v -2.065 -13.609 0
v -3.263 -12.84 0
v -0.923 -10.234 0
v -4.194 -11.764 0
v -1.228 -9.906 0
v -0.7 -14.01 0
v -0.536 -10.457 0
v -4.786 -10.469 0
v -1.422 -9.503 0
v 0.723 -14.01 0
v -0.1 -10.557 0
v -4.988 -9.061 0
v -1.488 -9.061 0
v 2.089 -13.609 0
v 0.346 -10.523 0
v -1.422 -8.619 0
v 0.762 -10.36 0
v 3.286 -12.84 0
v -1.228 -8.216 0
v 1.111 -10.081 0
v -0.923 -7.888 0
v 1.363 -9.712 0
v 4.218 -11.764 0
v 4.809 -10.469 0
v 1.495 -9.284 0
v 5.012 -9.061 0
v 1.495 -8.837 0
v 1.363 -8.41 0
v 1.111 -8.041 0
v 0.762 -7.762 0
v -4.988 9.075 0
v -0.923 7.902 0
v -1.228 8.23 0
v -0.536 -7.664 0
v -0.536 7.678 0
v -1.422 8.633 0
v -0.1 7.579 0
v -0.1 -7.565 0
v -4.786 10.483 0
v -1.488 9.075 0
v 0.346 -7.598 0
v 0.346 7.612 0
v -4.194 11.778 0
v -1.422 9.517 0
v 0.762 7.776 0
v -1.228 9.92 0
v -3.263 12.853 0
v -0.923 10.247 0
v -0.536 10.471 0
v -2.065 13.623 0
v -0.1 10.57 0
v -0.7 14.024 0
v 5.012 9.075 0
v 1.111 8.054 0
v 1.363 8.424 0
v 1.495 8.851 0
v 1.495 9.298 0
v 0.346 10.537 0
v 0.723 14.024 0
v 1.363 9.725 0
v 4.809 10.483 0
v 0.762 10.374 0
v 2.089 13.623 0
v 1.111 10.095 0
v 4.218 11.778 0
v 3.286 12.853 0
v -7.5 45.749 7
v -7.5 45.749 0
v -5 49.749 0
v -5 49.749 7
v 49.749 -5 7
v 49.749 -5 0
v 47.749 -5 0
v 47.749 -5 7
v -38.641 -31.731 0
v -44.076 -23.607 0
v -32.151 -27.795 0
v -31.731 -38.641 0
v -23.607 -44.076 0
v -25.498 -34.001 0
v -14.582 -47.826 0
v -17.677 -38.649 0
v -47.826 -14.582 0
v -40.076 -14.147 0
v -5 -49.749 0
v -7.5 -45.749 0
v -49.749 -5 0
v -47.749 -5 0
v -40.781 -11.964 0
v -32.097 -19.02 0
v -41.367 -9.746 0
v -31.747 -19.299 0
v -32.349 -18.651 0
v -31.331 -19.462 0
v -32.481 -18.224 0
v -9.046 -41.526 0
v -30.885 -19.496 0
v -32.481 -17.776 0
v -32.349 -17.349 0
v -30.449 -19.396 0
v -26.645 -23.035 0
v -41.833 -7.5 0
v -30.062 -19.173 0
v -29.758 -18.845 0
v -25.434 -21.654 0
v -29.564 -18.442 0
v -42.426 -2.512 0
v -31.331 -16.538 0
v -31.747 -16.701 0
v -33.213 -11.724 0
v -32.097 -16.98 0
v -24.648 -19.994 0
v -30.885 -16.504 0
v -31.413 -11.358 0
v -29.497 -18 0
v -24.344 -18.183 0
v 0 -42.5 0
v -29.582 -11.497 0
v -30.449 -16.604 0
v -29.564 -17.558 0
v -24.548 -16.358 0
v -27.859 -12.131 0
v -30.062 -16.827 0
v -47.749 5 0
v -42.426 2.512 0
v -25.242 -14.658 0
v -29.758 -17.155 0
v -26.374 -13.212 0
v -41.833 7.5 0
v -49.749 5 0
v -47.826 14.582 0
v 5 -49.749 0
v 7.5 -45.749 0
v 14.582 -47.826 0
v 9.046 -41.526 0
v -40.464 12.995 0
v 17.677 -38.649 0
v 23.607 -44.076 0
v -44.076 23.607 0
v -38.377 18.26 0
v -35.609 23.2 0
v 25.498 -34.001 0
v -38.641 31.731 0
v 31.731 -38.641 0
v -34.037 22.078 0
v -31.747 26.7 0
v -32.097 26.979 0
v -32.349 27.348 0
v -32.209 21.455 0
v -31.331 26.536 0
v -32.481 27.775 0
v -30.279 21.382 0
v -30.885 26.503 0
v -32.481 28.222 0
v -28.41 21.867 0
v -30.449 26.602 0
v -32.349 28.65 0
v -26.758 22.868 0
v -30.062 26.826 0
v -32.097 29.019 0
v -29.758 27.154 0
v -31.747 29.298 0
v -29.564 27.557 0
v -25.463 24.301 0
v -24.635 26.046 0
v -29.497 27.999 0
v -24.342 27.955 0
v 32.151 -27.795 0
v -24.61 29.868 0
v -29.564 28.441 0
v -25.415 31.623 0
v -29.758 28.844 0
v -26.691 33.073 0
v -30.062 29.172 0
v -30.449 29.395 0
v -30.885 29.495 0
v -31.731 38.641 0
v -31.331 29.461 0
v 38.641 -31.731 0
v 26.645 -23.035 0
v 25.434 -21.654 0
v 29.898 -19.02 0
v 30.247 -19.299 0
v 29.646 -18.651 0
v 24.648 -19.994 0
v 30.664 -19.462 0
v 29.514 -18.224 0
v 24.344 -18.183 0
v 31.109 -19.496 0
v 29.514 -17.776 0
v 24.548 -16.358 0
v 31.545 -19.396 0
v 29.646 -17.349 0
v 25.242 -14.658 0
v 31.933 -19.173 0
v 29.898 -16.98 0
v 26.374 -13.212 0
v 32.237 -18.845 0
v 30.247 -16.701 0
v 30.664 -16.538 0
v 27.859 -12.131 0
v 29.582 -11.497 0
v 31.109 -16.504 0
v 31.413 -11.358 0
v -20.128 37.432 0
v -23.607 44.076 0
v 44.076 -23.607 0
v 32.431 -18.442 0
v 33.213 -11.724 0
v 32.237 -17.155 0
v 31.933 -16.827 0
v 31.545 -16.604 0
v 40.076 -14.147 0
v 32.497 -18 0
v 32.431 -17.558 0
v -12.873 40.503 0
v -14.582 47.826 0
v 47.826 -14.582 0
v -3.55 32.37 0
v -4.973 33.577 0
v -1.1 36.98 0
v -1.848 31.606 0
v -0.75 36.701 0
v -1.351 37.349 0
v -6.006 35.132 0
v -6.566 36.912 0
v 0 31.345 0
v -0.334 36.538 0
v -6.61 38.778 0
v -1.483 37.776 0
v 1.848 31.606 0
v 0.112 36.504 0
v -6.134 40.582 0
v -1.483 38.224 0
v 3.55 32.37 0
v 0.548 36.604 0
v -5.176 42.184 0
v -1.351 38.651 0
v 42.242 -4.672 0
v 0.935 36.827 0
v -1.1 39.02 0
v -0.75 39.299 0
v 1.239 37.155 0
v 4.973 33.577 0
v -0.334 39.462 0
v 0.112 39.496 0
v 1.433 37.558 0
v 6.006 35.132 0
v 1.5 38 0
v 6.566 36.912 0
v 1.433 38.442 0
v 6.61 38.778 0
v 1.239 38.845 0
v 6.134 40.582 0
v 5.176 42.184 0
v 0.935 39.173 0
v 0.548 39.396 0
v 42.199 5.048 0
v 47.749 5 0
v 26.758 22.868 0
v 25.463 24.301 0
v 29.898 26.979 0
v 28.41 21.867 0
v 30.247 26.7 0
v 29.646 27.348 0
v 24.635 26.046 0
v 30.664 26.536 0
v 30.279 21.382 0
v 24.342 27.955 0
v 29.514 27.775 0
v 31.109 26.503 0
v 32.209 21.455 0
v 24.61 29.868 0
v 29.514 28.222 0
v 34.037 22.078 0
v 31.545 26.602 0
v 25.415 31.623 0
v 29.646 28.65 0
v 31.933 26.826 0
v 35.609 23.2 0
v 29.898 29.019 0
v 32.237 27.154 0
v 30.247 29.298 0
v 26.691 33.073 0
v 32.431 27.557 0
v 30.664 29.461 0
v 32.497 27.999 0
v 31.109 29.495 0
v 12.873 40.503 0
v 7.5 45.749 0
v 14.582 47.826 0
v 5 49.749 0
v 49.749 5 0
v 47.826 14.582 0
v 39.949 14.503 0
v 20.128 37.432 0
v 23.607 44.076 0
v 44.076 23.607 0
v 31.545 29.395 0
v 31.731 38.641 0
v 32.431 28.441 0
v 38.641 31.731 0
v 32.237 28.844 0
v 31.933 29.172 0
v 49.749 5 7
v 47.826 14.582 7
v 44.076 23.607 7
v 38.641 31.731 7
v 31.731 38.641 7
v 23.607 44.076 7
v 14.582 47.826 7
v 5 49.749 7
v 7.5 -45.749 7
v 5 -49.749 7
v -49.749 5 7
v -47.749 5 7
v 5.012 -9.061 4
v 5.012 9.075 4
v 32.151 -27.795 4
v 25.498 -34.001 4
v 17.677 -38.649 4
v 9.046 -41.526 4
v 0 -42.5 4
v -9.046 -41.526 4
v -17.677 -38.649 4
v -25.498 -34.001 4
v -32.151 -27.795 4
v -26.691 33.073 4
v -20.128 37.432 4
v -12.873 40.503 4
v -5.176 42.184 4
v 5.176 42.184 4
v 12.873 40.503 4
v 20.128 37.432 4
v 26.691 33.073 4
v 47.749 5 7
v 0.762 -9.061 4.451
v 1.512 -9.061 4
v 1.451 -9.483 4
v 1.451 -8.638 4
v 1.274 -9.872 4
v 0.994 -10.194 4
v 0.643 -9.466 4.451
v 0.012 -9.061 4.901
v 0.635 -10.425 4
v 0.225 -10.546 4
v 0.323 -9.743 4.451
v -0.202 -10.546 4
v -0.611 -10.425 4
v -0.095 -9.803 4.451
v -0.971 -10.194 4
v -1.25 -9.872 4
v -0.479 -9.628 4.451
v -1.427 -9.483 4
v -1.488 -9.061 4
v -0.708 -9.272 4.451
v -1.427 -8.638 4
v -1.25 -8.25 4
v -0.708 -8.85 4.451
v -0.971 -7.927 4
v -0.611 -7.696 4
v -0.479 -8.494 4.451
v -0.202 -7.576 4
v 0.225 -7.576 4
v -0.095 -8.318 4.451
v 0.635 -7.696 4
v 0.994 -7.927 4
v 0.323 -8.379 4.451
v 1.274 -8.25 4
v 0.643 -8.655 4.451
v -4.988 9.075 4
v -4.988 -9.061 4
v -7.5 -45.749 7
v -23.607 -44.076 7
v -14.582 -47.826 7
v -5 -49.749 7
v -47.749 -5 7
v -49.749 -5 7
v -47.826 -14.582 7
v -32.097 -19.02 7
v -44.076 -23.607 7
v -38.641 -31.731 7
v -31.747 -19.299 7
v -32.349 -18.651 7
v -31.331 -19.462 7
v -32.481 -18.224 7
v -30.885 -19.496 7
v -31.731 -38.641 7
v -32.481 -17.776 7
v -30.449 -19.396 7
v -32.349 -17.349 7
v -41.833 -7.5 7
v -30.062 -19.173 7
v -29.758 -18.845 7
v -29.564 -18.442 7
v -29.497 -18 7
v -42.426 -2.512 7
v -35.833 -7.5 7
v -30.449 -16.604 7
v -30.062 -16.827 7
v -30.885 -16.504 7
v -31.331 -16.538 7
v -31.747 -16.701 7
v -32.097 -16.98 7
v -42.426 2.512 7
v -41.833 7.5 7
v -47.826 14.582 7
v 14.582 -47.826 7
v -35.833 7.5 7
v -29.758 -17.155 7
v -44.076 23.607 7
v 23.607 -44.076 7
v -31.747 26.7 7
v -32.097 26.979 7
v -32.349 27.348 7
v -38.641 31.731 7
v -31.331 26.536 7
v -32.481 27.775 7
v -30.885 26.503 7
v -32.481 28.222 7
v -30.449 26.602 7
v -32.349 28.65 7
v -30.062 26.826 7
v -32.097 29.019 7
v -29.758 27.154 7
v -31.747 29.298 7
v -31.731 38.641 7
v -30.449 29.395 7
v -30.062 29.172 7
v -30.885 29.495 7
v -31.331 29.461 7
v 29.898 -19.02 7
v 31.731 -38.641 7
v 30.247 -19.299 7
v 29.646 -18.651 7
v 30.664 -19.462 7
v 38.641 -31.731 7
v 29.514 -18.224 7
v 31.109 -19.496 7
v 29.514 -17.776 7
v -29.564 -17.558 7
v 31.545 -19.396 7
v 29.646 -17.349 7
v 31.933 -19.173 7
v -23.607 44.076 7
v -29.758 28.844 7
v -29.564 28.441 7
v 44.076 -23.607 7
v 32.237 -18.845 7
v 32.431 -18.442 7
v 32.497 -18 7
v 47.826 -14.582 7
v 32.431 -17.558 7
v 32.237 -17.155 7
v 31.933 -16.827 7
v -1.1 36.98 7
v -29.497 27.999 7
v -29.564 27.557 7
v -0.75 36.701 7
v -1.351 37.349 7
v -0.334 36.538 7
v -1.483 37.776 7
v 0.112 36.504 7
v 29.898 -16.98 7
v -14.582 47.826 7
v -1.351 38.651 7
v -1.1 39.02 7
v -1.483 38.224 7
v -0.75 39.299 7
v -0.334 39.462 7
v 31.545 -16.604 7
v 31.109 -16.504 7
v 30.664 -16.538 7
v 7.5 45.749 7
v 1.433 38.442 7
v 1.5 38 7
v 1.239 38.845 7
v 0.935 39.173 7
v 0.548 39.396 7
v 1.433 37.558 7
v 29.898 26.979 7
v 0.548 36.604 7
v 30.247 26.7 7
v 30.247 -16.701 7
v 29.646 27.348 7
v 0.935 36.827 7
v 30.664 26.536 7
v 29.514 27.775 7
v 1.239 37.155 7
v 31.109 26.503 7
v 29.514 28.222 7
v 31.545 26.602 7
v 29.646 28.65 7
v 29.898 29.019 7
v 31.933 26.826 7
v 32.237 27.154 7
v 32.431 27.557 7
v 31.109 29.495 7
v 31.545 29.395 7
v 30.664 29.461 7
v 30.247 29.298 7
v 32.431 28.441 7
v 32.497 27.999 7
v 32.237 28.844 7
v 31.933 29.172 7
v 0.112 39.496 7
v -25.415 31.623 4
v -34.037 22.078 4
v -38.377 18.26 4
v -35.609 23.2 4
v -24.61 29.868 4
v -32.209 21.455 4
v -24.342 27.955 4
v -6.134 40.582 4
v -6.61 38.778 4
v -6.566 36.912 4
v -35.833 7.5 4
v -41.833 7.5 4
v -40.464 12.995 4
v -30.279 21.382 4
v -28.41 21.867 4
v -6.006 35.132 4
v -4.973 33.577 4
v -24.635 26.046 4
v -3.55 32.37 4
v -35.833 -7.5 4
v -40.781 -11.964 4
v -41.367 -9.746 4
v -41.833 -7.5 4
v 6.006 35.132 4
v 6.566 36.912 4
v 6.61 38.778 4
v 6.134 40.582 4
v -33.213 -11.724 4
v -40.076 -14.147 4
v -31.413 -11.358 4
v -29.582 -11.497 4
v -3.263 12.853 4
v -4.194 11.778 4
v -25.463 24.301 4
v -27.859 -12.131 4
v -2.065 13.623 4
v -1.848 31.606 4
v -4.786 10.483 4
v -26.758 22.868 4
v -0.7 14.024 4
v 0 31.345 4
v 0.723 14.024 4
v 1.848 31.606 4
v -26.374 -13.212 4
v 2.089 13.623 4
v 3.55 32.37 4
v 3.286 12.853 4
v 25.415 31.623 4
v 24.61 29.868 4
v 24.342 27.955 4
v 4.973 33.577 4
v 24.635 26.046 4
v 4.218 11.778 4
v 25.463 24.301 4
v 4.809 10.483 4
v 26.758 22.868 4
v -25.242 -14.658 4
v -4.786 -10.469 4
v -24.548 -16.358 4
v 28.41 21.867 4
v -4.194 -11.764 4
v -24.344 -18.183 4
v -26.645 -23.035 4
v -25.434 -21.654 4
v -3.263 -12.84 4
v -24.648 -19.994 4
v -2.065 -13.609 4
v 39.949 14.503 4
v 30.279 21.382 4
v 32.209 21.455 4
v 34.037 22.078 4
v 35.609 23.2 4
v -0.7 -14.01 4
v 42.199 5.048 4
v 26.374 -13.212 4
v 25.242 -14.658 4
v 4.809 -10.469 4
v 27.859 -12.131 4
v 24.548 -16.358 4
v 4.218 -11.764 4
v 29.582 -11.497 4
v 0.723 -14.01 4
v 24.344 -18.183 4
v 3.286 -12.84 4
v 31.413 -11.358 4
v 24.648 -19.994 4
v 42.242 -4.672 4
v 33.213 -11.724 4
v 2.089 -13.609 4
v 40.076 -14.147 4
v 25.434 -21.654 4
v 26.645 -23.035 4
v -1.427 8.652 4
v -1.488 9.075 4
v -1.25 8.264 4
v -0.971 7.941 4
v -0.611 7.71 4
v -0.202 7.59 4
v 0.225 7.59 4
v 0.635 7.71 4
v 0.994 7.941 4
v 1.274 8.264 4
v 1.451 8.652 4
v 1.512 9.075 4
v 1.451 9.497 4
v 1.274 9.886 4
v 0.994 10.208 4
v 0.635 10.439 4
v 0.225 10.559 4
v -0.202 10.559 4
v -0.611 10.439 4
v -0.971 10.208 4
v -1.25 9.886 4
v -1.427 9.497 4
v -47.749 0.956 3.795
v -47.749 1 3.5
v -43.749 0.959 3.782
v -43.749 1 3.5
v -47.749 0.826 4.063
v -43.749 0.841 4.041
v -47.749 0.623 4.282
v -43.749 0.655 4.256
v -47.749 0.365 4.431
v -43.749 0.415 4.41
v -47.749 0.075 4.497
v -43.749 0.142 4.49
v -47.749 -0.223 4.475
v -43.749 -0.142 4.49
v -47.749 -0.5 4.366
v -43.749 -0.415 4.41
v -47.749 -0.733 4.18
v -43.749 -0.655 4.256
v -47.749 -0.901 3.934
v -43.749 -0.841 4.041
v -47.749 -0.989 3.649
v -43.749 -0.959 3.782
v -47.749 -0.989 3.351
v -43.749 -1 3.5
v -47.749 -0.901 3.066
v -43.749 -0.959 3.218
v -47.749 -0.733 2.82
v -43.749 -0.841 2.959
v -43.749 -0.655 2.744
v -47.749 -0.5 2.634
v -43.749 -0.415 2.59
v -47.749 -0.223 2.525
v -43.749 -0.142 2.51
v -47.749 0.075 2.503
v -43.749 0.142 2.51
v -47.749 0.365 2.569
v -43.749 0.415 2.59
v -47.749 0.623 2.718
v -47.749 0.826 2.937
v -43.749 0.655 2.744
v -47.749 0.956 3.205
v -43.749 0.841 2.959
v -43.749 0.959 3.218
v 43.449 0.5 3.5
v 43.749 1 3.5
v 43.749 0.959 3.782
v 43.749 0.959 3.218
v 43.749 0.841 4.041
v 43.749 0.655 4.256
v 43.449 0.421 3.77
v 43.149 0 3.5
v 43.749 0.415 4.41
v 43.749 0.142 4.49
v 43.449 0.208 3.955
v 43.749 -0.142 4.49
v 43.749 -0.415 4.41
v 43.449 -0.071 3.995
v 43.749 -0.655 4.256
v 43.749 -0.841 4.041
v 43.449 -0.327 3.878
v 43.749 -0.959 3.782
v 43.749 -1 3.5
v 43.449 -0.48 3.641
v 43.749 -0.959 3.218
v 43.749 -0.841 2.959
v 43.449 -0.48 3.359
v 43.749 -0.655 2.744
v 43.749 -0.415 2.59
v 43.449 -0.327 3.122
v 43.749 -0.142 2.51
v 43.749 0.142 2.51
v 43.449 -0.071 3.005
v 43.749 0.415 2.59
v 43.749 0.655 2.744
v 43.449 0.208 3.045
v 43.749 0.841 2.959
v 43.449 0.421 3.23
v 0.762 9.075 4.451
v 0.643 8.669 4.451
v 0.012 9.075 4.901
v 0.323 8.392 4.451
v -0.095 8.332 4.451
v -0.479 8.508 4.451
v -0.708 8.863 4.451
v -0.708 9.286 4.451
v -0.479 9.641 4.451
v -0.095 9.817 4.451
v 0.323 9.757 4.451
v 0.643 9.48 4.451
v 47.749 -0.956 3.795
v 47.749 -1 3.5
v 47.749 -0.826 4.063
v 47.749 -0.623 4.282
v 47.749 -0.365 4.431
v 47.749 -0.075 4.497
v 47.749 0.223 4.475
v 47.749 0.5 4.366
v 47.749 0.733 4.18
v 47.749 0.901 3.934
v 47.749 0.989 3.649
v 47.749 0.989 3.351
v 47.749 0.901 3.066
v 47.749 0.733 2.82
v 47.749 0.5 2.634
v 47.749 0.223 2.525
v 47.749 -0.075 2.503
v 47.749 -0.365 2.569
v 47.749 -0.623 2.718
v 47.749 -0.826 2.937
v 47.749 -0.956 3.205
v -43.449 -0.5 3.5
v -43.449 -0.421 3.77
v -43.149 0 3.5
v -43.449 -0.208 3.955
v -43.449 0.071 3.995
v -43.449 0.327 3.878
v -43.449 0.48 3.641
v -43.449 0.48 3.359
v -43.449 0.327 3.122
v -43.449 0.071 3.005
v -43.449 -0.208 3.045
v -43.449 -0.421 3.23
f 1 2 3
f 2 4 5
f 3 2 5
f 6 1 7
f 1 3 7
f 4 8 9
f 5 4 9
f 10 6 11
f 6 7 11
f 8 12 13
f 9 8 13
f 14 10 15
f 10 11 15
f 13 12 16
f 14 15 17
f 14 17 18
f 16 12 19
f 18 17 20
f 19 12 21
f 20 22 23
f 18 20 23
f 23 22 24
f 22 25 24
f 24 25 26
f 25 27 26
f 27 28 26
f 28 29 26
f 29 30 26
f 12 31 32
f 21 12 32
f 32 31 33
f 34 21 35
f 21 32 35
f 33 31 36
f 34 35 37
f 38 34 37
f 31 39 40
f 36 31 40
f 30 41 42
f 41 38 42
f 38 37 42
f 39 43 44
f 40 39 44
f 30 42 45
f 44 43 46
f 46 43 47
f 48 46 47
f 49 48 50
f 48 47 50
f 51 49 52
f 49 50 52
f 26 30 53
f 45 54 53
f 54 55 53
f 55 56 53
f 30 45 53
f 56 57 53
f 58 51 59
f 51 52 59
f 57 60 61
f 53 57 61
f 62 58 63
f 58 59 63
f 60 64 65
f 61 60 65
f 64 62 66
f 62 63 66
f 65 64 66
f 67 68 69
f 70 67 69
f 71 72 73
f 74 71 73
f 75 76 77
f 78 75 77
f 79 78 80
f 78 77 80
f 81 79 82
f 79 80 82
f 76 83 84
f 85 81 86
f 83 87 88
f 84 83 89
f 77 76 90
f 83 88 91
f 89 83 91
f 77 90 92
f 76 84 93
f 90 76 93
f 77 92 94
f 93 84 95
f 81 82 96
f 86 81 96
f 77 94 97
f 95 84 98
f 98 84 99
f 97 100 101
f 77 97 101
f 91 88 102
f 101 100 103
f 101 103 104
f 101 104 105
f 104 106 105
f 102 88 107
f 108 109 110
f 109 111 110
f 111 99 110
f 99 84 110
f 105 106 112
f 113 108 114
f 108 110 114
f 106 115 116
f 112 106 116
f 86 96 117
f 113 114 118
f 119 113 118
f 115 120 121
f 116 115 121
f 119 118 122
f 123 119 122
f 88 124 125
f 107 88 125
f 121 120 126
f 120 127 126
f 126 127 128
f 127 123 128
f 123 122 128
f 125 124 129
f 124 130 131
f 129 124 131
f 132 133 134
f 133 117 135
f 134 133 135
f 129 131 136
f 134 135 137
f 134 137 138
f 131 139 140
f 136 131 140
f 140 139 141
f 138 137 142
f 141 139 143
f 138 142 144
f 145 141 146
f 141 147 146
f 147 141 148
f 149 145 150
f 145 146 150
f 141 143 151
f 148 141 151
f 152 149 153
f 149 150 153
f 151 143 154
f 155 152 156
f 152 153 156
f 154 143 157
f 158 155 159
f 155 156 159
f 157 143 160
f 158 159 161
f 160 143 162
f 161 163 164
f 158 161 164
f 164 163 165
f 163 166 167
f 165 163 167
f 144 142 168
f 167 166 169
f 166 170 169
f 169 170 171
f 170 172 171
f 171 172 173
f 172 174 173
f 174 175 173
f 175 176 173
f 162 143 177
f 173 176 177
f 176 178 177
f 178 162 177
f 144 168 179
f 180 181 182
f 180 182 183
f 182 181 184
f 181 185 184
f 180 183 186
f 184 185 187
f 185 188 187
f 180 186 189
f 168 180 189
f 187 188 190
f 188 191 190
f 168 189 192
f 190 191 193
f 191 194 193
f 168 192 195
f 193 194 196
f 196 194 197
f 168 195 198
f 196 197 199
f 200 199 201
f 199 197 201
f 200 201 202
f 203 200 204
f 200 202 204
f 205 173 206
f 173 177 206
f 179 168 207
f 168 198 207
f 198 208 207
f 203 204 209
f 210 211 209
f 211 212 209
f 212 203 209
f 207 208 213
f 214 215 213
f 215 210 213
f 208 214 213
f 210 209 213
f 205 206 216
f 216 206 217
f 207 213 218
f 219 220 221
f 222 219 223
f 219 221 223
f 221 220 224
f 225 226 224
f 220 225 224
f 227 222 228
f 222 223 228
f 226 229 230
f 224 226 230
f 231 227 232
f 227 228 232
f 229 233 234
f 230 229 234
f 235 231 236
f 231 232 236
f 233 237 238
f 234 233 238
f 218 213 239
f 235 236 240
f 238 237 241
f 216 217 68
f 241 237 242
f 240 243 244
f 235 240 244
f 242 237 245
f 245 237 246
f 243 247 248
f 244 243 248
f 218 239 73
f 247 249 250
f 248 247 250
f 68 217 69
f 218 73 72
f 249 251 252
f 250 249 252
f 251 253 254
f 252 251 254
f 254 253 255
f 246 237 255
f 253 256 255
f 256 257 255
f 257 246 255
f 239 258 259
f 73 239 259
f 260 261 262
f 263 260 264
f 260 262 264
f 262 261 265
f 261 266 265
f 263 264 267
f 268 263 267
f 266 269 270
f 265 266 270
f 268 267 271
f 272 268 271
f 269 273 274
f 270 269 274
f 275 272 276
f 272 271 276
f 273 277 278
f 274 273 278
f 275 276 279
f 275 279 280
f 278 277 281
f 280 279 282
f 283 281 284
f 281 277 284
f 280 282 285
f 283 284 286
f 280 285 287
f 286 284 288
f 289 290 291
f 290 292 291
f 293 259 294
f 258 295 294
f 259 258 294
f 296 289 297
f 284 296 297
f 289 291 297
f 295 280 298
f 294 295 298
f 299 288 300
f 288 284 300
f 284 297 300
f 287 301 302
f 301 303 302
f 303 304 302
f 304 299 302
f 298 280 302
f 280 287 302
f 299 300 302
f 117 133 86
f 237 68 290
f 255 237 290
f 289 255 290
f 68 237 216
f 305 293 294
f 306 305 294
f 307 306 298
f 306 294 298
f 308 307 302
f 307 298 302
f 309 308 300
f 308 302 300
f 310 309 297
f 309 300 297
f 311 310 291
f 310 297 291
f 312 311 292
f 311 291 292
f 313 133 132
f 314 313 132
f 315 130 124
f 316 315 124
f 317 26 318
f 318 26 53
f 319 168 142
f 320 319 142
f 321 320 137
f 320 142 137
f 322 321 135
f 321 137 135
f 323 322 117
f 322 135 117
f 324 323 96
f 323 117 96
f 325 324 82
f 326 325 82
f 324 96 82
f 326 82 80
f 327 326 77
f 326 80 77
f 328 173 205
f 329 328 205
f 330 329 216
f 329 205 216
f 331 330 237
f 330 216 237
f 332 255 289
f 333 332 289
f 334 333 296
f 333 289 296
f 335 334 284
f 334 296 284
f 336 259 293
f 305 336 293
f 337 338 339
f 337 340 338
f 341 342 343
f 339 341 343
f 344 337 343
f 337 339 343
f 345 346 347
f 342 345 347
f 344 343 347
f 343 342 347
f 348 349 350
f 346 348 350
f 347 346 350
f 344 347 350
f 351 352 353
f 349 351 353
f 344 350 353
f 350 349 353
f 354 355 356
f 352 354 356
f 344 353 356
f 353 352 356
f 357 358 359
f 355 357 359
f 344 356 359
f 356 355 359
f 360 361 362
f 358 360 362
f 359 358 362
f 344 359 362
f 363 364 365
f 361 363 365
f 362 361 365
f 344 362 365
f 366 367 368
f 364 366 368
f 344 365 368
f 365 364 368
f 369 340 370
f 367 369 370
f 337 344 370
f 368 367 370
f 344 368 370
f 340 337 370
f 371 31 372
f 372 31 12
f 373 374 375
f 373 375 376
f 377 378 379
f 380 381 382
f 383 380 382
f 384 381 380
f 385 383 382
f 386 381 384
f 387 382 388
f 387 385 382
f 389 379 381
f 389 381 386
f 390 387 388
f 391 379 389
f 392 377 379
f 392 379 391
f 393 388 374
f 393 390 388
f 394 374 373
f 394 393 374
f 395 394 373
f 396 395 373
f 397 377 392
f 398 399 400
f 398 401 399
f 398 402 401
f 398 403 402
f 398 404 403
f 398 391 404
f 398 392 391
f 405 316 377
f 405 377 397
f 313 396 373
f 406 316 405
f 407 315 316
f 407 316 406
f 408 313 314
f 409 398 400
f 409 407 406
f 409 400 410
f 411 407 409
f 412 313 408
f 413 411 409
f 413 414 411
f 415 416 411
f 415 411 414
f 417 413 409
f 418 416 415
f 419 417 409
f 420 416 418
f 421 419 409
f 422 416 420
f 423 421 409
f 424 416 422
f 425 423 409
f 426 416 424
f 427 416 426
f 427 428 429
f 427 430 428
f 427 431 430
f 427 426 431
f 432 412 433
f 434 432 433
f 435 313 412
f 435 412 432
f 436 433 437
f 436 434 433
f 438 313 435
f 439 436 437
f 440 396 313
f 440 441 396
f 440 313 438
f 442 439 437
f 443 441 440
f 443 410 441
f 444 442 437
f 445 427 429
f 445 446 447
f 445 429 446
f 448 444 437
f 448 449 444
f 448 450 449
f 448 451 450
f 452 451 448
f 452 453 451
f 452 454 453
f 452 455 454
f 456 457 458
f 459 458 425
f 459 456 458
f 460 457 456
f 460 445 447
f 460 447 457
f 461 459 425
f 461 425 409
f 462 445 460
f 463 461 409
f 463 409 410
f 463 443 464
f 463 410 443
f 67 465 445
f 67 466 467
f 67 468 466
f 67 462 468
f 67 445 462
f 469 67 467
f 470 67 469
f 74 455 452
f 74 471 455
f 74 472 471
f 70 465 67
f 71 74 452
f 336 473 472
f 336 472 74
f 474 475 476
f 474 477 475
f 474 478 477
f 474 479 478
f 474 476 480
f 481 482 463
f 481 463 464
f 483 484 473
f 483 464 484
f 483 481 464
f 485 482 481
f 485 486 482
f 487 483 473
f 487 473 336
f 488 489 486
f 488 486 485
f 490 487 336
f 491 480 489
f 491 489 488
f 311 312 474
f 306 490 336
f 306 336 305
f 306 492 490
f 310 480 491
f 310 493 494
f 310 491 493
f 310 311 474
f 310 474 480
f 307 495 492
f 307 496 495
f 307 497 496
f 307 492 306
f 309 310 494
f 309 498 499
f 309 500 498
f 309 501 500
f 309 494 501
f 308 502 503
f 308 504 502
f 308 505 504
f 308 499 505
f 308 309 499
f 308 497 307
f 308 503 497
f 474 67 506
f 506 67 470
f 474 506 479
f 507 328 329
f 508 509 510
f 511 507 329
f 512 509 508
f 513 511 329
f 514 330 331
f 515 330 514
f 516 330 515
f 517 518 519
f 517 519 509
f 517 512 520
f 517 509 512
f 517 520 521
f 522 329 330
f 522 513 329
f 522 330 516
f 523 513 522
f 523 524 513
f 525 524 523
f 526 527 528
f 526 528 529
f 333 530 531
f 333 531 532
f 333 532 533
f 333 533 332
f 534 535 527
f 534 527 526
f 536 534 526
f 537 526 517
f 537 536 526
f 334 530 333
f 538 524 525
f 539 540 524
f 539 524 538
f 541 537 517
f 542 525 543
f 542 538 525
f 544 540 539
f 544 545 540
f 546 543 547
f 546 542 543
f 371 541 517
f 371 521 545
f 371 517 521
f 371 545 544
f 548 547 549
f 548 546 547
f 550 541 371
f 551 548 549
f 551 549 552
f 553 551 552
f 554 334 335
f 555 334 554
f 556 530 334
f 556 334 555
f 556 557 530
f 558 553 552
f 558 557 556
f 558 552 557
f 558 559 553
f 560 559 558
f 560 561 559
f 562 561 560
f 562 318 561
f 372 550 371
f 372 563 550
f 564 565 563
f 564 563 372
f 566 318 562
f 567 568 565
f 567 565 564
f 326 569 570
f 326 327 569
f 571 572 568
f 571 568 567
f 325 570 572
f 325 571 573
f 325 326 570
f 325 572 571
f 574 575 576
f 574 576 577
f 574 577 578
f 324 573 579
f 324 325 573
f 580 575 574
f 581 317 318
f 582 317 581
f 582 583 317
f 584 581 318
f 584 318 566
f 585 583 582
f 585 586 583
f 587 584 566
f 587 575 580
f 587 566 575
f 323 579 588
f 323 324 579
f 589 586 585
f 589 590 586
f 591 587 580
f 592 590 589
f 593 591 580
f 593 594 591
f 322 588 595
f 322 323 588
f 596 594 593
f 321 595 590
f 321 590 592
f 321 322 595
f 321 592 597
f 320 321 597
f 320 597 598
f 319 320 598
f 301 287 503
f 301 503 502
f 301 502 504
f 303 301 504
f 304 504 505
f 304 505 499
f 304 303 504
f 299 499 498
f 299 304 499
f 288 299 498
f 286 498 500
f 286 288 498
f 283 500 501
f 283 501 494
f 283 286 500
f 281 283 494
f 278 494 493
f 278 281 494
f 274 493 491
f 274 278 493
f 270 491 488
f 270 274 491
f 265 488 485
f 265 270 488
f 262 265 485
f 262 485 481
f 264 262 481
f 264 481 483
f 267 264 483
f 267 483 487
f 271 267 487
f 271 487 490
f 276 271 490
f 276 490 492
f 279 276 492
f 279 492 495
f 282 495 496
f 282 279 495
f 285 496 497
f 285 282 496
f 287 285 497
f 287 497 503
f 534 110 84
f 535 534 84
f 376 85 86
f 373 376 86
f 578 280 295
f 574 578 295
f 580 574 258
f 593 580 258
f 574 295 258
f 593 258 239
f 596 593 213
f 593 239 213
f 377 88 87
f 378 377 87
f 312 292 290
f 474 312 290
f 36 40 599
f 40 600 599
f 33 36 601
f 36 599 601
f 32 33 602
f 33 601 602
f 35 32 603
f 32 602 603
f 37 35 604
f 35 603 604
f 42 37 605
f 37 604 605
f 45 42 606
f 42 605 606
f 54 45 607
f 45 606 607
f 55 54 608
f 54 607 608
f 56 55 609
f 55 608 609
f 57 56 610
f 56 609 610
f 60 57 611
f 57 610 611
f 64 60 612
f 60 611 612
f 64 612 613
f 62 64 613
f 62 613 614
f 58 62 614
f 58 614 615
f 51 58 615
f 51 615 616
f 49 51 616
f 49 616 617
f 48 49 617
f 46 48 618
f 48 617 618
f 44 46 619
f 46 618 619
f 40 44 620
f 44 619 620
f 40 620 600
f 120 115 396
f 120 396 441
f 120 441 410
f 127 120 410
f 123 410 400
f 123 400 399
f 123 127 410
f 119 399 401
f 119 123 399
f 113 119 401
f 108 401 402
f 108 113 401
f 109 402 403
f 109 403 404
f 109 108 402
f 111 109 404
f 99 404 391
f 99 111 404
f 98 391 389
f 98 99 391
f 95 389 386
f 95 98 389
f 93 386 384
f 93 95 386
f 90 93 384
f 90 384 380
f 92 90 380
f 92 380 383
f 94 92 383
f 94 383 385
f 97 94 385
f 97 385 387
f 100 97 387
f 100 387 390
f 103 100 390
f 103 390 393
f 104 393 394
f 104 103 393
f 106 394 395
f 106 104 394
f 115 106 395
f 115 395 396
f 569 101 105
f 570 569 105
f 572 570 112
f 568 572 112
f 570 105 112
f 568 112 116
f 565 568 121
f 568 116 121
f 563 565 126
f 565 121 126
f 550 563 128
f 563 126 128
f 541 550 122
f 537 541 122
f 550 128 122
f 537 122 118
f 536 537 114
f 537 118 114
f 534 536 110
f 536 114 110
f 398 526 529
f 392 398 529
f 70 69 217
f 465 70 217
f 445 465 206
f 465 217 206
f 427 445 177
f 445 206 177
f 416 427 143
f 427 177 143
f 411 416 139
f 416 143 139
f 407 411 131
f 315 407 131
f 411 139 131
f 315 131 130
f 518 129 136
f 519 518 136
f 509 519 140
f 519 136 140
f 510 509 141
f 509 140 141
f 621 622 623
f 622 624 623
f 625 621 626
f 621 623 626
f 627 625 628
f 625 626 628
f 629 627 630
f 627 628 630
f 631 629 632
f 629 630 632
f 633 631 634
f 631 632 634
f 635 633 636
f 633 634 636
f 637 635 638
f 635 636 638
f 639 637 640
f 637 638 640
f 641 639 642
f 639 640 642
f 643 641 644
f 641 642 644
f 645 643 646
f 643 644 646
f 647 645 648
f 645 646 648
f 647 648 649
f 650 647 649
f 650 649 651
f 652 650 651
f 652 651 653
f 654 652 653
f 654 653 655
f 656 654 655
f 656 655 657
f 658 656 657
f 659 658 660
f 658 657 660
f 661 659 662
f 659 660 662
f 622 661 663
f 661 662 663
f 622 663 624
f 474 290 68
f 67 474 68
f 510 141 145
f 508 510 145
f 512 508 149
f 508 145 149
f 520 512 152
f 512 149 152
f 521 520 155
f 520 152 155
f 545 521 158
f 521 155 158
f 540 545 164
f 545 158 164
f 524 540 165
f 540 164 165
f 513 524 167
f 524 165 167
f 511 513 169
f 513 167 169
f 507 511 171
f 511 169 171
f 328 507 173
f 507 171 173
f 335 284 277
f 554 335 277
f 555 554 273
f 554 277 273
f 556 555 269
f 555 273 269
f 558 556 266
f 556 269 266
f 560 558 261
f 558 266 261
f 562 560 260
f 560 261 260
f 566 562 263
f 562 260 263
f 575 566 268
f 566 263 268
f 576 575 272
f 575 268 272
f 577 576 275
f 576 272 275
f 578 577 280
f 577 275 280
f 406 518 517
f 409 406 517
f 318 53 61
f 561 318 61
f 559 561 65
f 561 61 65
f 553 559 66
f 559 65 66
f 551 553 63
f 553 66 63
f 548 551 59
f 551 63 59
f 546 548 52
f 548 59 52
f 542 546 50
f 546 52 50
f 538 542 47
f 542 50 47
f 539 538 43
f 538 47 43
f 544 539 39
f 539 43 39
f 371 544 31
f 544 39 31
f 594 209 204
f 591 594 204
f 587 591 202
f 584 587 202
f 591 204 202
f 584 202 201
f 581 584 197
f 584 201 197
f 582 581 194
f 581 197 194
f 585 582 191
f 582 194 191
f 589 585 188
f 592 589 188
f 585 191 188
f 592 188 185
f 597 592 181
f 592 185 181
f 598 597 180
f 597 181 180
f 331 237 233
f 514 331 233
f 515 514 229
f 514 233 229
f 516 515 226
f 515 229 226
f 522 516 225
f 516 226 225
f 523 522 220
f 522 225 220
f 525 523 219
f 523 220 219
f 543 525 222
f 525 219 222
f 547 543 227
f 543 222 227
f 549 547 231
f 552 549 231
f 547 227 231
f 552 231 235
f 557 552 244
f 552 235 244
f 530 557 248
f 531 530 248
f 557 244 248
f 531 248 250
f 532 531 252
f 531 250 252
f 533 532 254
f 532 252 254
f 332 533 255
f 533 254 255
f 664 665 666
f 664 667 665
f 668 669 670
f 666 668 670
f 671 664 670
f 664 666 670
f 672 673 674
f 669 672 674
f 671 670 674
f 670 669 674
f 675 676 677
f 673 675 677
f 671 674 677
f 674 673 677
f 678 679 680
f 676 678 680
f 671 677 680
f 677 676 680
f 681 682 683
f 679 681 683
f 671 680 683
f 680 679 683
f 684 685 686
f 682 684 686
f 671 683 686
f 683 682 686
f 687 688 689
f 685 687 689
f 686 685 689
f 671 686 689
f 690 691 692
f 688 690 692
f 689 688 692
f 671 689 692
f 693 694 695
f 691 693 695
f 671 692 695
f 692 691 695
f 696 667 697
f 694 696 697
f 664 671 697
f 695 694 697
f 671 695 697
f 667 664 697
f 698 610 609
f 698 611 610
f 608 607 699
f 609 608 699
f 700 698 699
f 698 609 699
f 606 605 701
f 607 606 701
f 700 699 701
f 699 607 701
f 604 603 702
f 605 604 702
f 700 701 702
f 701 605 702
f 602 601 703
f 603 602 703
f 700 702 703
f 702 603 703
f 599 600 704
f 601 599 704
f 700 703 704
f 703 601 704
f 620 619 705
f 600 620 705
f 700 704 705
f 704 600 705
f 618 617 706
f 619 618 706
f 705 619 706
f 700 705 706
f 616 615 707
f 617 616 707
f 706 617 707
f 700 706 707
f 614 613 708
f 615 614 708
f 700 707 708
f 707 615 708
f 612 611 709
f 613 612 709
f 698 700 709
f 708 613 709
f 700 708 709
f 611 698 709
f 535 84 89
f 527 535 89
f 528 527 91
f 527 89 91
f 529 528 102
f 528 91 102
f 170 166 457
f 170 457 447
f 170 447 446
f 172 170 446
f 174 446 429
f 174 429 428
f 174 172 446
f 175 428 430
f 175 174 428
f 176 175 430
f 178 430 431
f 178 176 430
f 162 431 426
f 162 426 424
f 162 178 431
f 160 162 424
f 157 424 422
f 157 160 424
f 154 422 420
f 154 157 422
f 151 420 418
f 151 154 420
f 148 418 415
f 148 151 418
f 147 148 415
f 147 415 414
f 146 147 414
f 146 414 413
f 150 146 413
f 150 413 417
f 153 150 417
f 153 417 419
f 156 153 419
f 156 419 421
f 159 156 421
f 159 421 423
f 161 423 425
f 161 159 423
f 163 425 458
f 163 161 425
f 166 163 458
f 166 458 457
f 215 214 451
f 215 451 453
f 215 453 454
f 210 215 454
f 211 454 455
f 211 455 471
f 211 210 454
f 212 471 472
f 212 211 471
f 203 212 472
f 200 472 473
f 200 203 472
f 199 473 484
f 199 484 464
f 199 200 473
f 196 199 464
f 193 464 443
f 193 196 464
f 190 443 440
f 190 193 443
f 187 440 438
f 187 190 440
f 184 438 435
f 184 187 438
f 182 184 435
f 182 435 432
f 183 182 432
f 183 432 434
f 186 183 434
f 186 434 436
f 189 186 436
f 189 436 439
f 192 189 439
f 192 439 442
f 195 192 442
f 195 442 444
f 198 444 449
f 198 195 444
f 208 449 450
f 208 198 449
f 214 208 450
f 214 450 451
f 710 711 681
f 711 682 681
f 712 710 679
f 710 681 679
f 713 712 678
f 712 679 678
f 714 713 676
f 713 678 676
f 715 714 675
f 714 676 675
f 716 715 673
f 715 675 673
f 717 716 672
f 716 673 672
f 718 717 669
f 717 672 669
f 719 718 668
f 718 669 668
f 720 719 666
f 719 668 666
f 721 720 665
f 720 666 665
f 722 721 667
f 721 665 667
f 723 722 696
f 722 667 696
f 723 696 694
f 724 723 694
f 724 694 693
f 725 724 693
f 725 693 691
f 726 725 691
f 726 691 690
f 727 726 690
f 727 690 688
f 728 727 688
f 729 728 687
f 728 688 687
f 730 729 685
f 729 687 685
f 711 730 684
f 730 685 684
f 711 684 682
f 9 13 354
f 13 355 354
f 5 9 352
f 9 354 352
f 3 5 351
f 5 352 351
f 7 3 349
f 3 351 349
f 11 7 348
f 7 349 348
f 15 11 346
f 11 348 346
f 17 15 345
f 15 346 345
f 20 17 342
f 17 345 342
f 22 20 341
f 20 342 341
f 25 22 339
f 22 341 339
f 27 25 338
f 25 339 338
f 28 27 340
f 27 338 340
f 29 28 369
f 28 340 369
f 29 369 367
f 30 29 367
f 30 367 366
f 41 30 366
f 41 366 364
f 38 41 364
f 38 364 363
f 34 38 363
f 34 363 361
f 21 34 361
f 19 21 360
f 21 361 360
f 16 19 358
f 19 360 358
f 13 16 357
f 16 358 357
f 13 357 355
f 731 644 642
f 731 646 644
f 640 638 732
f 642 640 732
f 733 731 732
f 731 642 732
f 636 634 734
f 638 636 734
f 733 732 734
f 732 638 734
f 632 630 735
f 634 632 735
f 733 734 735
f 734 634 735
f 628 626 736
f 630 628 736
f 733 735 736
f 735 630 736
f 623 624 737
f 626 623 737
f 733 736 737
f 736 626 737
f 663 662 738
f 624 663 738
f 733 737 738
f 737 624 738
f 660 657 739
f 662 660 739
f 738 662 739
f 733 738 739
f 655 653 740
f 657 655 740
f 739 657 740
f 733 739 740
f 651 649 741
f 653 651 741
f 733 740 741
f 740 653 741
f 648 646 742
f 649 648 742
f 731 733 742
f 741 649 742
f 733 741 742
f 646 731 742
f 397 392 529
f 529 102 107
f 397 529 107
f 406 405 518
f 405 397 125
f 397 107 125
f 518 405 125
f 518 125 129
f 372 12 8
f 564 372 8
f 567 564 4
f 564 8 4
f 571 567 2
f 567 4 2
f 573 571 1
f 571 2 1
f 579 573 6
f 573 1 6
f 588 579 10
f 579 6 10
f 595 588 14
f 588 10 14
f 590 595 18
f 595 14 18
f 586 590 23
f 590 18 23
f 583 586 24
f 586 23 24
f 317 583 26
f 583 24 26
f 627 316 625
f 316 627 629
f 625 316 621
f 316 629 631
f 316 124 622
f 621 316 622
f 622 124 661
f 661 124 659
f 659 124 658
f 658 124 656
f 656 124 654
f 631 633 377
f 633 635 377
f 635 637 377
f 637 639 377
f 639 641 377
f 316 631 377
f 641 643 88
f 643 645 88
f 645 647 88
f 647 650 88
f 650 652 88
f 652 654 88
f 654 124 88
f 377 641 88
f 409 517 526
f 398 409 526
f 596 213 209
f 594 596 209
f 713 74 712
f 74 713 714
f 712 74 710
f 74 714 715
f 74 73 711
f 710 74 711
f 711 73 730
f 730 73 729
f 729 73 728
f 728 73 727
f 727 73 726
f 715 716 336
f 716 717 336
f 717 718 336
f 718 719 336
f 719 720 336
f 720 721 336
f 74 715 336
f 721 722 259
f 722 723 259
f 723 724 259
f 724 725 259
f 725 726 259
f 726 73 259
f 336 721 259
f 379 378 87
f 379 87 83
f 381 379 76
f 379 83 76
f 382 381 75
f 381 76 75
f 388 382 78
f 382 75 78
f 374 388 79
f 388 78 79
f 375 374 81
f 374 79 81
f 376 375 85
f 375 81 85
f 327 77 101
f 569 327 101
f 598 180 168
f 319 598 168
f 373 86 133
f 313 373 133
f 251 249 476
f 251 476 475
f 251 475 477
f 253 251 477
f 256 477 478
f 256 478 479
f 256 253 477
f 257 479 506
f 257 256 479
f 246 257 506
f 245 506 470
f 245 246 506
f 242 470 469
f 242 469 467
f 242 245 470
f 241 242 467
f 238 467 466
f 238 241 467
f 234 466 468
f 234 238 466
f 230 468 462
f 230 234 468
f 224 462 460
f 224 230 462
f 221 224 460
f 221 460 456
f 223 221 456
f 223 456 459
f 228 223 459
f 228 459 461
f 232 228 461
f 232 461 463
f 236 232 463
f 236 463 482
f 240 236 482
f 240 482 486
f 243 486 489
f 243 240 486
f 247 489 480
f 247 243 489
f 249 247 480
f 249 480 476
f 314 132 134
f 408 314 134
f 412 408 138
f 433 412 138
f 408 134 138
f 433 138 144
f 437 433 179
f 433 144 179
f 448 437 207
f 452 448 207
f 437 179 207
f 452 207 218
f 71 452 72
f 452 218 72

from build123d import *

# Parameters (mm, degrees)
F0_R      = 1.5
F1_DEPTH  = 7
F3_DEPTH  = 4
F5_D      = 2
F5_DEPTH  = 4
F5_TIP    = 0.600860619
F7_D      = 2
F7_DEPTH  = 4
F7_TIP    = 0.600860619
F9_DEPTH  = 4
F10_D     = 3
F10_DEPTH = 4
F10_TIP   = 0.9012909285


with BuildPart() as f1:
    # F0 (on Top) → F1 (new body)
    with BuildSketch(Plane.XY):
        with BuildLine():
            ThreePointArc((-5, 49.7493718553), (-35.3553390204, 35.3553390982), (-49.7493718443, 5.0000001095))
            Line((-49.7493718443, 5.0000001095), (-47.7493718443, 5.0000001095))
            Line((-47.7493718443, 5.0000001095), (-47.7493718443, -4.9999998882))
            Line((-47.7493718443, -4.9999998882), (-49.7493718666, -4.9999998882))
            ThreePointArc((-49.7493718666, -4.9999998882), (-35.3553390593, -35.3553390593), (-4.9999998882, -49.7493718666))
            Line((-4.9999998882, -49.7493718666), (-7.4999998882, -45.7493718443))
            Line((-7.4999998882, -45.7493718443), (7.5000001118, -45.7493718443))
            Line((7.5000001118, -45.7493718443), (5.0000001095, -49.7493718443))
            ThreePointArc((5.0000001095, -49.7493718443), (35.355339138, -35.3553389807), (49.7493718666, -4.9999998882))
            Line((49.7493718666, -4.9999998882), (47.7493718666, -4.9999998882))
            Line((47.7493718666, -4.9999998882), (47.7493718443, 5.0000001095))
            Line((47.7493718443, 5.0000001095), (49.7493718443, 5.0000001095))
            ThreePointArc((49.7493718443, 5.0000001095), (35.3553390204, 35.3553390982), (5, 49.7493718553))
            Line((5, 49.7493718553), (7.5, 45.7493718553))
            Line((7.5, 45.7493718553), (-7.5, 45.7493718553))
            Line((-7.5, 45.7493718553), (-5, 49.7493718553))
        make_face()
        with Locations((-30.99729, -18)):
            Circle(F0_R, mode=Mode.SUBTRACT)
        with Locations((30.99729, -18)):
            Circle(F0_R, mode=Mode.SUBTRACT)
        with BuildLine():
            ThreePointArc((-41.8330013267, -7.5), (-42.5, 0), (-41.8330013267, 7.5))
            Line((-41.8330013267, 7.5), (-35.8330013267, 7.5))
            Line((-35.8330013267, 7.5), (-35.8330013267, -7.5))
            Line((-35.8330013267, -7.5), (-41.8330013267, -7.5))
        make_face(mode=Mode.SUBTRACT)
        with Locations((-30.99729, 27.99879)):
            Circle(F0_R, mode=Mode.SUBTRACT)
        with Locations((0, 38)):
            Circle(F0_R, mode=Mode.SUBTRACT)
        with Locations((30.99729, 27.99879)):
            Circle(F0_R, mode=Mode.SUBTRACT)
    extrude(amount=F1_DEPTH)

    # F2 (on face) → F3 (cut)
    with BuildSketch(Plane(origin=(0, 0, 0), x_dir=(1, 0, 0), z_dir=(0, 0, -1))):
        with BuildLine():
            Line((-33.2126875853, 11.7240947344), (-40.0763431849, 14.1469684711))
            ThreePointArc((-40.0763431849, 14.1469684711), (-42.1991788884, -5.0477025611), (-35.6090242019, -23.2001593829))
            ThreePointArc((-35.6090242019, -23.2001593829), (-26.0583647767, -23.5376280677), (-26.6909660756, -33.0732872565))
            ThreePointArc((-26.6909660756, -33.0732872565), (-16.571886566, -39.1359499136), (-5.1761259013, -42.1836191033))
            ThreePointArc((-5.1761259013, -42.1836191033), (0, -31.344555), (5.1761259013, -42.1836191033))
            ThreePointArc((5.1761259013, -42.1836191033), (16.571886566, -39.1359499136), (26.6909660756, -33.0732872565))
            ThreePointArc((26.6909660756, -33.0732872565), (26.0583647767, -23.5376280677), (35.6090242019, -23.2001593829))
            ThreePointArc((35.6090242019, -23.2001593829), (42.1991788884, -5.0477025611), (40.0763431849, 14.1469684711))
            Line((40.0763431849, 14.1469684711), (33.2126875853, 11.7240947344))
            ThreePointArc((33.2126875853, 11.7240947344), (25.241859967, 14.6578452312), (26.6446104223, 23.0347943213))
            Line((26.6446104223, 23.0347943213), (32.150922703, 27.7951105295))
            ThreePointArc((32.150922703, 27.7951105295), (0, 42.5), (-32.150922703, 27.7951105295))
            Line((-32.150922703, 27.7951105295), (-26.6446104223, 23.0347943213))
            ThreePointArc((-26.6446104223, 23.0347943213), (-25.241859967, 14.6578452312), (-33.2126875853, 11.7240947344))
        make_face()
    extrude(amount=-F3_DEPTH, mode=Mode.SUBTRACT)

    # F5
    with Locations(Plane(origin=(-47.7493718443, 0, 0), x_dir=(0, -1, 0), z_dir=(-1, 0, 0))):
        with Locations((-1.106e-07, 3.5)):
            Hole(F5_D / 2, depth=F5_DEPTH)
            with Locations((0, 0, -(F5_DEPTH + F5_TIP / 2))):  # 118° drill point
                Cone(0, F5_D / 2, F5_TIP, mode=Mode.SUBTRACT)

    # F7
    with Locations(Plane(origin=(47.7493718554, 1.062e-07, 0), x_dir=(-2.2e-09, 1, 0), z_dir=(1, 2.2e-09, 0))):
        with Locations((4.4e-09, 3.5)):
            Hole(F7_D / 2, depth=F7_DEPTH)
            with Locations((0, 0, -(F7_DEPTH + F7_TIP / 2))):  # 118° drill point
                Cone(0, F7_D / 2, F7_TIP, mode=Mode.SUBTRACT)

    # F8 (on Top) → F9 (join)
    with BuildSketch(Plane.XY):
        with BuildLine():
            Line((-4.9882119756, 9.0746689573), (-4.9882119756, -9.0608097649))
            ThreePointArc((-4.9882119756, -9.0608097649), (0.0117880244, -14.0608097649), (5.0117880244, -9.0608097649))
            Line((5.0117880244, -9.0608097649), (5.0117880244, 9.0746689573))
            ThreePointArc((5.0117880244, 9.0746689573), (0.0117880244, 14.0746689573), (-4.9882119756, 9.0746689573))
        make_face()
    extrude(amount=F9_DEPTH)

    # F10
    with Locations(Plane(origin=(0, 0, 0), x_dir=(1, 0, 0), z_dir=(0, 0, -1))):
        with Locations((0.0117880244, 9.0608097649), (0.0117880244, -9.0746689573)):
            Hole(F10_D / 2, depth=F10_DEPTH)
            with Locations((0, 0, -(F10_DEPTH + F10_TIP / 2))):  # 118° drill point
                Cone(0, F10_D / 2, F10_TIP, mode=Mode.SUBTRACT)


solid = f1.part
